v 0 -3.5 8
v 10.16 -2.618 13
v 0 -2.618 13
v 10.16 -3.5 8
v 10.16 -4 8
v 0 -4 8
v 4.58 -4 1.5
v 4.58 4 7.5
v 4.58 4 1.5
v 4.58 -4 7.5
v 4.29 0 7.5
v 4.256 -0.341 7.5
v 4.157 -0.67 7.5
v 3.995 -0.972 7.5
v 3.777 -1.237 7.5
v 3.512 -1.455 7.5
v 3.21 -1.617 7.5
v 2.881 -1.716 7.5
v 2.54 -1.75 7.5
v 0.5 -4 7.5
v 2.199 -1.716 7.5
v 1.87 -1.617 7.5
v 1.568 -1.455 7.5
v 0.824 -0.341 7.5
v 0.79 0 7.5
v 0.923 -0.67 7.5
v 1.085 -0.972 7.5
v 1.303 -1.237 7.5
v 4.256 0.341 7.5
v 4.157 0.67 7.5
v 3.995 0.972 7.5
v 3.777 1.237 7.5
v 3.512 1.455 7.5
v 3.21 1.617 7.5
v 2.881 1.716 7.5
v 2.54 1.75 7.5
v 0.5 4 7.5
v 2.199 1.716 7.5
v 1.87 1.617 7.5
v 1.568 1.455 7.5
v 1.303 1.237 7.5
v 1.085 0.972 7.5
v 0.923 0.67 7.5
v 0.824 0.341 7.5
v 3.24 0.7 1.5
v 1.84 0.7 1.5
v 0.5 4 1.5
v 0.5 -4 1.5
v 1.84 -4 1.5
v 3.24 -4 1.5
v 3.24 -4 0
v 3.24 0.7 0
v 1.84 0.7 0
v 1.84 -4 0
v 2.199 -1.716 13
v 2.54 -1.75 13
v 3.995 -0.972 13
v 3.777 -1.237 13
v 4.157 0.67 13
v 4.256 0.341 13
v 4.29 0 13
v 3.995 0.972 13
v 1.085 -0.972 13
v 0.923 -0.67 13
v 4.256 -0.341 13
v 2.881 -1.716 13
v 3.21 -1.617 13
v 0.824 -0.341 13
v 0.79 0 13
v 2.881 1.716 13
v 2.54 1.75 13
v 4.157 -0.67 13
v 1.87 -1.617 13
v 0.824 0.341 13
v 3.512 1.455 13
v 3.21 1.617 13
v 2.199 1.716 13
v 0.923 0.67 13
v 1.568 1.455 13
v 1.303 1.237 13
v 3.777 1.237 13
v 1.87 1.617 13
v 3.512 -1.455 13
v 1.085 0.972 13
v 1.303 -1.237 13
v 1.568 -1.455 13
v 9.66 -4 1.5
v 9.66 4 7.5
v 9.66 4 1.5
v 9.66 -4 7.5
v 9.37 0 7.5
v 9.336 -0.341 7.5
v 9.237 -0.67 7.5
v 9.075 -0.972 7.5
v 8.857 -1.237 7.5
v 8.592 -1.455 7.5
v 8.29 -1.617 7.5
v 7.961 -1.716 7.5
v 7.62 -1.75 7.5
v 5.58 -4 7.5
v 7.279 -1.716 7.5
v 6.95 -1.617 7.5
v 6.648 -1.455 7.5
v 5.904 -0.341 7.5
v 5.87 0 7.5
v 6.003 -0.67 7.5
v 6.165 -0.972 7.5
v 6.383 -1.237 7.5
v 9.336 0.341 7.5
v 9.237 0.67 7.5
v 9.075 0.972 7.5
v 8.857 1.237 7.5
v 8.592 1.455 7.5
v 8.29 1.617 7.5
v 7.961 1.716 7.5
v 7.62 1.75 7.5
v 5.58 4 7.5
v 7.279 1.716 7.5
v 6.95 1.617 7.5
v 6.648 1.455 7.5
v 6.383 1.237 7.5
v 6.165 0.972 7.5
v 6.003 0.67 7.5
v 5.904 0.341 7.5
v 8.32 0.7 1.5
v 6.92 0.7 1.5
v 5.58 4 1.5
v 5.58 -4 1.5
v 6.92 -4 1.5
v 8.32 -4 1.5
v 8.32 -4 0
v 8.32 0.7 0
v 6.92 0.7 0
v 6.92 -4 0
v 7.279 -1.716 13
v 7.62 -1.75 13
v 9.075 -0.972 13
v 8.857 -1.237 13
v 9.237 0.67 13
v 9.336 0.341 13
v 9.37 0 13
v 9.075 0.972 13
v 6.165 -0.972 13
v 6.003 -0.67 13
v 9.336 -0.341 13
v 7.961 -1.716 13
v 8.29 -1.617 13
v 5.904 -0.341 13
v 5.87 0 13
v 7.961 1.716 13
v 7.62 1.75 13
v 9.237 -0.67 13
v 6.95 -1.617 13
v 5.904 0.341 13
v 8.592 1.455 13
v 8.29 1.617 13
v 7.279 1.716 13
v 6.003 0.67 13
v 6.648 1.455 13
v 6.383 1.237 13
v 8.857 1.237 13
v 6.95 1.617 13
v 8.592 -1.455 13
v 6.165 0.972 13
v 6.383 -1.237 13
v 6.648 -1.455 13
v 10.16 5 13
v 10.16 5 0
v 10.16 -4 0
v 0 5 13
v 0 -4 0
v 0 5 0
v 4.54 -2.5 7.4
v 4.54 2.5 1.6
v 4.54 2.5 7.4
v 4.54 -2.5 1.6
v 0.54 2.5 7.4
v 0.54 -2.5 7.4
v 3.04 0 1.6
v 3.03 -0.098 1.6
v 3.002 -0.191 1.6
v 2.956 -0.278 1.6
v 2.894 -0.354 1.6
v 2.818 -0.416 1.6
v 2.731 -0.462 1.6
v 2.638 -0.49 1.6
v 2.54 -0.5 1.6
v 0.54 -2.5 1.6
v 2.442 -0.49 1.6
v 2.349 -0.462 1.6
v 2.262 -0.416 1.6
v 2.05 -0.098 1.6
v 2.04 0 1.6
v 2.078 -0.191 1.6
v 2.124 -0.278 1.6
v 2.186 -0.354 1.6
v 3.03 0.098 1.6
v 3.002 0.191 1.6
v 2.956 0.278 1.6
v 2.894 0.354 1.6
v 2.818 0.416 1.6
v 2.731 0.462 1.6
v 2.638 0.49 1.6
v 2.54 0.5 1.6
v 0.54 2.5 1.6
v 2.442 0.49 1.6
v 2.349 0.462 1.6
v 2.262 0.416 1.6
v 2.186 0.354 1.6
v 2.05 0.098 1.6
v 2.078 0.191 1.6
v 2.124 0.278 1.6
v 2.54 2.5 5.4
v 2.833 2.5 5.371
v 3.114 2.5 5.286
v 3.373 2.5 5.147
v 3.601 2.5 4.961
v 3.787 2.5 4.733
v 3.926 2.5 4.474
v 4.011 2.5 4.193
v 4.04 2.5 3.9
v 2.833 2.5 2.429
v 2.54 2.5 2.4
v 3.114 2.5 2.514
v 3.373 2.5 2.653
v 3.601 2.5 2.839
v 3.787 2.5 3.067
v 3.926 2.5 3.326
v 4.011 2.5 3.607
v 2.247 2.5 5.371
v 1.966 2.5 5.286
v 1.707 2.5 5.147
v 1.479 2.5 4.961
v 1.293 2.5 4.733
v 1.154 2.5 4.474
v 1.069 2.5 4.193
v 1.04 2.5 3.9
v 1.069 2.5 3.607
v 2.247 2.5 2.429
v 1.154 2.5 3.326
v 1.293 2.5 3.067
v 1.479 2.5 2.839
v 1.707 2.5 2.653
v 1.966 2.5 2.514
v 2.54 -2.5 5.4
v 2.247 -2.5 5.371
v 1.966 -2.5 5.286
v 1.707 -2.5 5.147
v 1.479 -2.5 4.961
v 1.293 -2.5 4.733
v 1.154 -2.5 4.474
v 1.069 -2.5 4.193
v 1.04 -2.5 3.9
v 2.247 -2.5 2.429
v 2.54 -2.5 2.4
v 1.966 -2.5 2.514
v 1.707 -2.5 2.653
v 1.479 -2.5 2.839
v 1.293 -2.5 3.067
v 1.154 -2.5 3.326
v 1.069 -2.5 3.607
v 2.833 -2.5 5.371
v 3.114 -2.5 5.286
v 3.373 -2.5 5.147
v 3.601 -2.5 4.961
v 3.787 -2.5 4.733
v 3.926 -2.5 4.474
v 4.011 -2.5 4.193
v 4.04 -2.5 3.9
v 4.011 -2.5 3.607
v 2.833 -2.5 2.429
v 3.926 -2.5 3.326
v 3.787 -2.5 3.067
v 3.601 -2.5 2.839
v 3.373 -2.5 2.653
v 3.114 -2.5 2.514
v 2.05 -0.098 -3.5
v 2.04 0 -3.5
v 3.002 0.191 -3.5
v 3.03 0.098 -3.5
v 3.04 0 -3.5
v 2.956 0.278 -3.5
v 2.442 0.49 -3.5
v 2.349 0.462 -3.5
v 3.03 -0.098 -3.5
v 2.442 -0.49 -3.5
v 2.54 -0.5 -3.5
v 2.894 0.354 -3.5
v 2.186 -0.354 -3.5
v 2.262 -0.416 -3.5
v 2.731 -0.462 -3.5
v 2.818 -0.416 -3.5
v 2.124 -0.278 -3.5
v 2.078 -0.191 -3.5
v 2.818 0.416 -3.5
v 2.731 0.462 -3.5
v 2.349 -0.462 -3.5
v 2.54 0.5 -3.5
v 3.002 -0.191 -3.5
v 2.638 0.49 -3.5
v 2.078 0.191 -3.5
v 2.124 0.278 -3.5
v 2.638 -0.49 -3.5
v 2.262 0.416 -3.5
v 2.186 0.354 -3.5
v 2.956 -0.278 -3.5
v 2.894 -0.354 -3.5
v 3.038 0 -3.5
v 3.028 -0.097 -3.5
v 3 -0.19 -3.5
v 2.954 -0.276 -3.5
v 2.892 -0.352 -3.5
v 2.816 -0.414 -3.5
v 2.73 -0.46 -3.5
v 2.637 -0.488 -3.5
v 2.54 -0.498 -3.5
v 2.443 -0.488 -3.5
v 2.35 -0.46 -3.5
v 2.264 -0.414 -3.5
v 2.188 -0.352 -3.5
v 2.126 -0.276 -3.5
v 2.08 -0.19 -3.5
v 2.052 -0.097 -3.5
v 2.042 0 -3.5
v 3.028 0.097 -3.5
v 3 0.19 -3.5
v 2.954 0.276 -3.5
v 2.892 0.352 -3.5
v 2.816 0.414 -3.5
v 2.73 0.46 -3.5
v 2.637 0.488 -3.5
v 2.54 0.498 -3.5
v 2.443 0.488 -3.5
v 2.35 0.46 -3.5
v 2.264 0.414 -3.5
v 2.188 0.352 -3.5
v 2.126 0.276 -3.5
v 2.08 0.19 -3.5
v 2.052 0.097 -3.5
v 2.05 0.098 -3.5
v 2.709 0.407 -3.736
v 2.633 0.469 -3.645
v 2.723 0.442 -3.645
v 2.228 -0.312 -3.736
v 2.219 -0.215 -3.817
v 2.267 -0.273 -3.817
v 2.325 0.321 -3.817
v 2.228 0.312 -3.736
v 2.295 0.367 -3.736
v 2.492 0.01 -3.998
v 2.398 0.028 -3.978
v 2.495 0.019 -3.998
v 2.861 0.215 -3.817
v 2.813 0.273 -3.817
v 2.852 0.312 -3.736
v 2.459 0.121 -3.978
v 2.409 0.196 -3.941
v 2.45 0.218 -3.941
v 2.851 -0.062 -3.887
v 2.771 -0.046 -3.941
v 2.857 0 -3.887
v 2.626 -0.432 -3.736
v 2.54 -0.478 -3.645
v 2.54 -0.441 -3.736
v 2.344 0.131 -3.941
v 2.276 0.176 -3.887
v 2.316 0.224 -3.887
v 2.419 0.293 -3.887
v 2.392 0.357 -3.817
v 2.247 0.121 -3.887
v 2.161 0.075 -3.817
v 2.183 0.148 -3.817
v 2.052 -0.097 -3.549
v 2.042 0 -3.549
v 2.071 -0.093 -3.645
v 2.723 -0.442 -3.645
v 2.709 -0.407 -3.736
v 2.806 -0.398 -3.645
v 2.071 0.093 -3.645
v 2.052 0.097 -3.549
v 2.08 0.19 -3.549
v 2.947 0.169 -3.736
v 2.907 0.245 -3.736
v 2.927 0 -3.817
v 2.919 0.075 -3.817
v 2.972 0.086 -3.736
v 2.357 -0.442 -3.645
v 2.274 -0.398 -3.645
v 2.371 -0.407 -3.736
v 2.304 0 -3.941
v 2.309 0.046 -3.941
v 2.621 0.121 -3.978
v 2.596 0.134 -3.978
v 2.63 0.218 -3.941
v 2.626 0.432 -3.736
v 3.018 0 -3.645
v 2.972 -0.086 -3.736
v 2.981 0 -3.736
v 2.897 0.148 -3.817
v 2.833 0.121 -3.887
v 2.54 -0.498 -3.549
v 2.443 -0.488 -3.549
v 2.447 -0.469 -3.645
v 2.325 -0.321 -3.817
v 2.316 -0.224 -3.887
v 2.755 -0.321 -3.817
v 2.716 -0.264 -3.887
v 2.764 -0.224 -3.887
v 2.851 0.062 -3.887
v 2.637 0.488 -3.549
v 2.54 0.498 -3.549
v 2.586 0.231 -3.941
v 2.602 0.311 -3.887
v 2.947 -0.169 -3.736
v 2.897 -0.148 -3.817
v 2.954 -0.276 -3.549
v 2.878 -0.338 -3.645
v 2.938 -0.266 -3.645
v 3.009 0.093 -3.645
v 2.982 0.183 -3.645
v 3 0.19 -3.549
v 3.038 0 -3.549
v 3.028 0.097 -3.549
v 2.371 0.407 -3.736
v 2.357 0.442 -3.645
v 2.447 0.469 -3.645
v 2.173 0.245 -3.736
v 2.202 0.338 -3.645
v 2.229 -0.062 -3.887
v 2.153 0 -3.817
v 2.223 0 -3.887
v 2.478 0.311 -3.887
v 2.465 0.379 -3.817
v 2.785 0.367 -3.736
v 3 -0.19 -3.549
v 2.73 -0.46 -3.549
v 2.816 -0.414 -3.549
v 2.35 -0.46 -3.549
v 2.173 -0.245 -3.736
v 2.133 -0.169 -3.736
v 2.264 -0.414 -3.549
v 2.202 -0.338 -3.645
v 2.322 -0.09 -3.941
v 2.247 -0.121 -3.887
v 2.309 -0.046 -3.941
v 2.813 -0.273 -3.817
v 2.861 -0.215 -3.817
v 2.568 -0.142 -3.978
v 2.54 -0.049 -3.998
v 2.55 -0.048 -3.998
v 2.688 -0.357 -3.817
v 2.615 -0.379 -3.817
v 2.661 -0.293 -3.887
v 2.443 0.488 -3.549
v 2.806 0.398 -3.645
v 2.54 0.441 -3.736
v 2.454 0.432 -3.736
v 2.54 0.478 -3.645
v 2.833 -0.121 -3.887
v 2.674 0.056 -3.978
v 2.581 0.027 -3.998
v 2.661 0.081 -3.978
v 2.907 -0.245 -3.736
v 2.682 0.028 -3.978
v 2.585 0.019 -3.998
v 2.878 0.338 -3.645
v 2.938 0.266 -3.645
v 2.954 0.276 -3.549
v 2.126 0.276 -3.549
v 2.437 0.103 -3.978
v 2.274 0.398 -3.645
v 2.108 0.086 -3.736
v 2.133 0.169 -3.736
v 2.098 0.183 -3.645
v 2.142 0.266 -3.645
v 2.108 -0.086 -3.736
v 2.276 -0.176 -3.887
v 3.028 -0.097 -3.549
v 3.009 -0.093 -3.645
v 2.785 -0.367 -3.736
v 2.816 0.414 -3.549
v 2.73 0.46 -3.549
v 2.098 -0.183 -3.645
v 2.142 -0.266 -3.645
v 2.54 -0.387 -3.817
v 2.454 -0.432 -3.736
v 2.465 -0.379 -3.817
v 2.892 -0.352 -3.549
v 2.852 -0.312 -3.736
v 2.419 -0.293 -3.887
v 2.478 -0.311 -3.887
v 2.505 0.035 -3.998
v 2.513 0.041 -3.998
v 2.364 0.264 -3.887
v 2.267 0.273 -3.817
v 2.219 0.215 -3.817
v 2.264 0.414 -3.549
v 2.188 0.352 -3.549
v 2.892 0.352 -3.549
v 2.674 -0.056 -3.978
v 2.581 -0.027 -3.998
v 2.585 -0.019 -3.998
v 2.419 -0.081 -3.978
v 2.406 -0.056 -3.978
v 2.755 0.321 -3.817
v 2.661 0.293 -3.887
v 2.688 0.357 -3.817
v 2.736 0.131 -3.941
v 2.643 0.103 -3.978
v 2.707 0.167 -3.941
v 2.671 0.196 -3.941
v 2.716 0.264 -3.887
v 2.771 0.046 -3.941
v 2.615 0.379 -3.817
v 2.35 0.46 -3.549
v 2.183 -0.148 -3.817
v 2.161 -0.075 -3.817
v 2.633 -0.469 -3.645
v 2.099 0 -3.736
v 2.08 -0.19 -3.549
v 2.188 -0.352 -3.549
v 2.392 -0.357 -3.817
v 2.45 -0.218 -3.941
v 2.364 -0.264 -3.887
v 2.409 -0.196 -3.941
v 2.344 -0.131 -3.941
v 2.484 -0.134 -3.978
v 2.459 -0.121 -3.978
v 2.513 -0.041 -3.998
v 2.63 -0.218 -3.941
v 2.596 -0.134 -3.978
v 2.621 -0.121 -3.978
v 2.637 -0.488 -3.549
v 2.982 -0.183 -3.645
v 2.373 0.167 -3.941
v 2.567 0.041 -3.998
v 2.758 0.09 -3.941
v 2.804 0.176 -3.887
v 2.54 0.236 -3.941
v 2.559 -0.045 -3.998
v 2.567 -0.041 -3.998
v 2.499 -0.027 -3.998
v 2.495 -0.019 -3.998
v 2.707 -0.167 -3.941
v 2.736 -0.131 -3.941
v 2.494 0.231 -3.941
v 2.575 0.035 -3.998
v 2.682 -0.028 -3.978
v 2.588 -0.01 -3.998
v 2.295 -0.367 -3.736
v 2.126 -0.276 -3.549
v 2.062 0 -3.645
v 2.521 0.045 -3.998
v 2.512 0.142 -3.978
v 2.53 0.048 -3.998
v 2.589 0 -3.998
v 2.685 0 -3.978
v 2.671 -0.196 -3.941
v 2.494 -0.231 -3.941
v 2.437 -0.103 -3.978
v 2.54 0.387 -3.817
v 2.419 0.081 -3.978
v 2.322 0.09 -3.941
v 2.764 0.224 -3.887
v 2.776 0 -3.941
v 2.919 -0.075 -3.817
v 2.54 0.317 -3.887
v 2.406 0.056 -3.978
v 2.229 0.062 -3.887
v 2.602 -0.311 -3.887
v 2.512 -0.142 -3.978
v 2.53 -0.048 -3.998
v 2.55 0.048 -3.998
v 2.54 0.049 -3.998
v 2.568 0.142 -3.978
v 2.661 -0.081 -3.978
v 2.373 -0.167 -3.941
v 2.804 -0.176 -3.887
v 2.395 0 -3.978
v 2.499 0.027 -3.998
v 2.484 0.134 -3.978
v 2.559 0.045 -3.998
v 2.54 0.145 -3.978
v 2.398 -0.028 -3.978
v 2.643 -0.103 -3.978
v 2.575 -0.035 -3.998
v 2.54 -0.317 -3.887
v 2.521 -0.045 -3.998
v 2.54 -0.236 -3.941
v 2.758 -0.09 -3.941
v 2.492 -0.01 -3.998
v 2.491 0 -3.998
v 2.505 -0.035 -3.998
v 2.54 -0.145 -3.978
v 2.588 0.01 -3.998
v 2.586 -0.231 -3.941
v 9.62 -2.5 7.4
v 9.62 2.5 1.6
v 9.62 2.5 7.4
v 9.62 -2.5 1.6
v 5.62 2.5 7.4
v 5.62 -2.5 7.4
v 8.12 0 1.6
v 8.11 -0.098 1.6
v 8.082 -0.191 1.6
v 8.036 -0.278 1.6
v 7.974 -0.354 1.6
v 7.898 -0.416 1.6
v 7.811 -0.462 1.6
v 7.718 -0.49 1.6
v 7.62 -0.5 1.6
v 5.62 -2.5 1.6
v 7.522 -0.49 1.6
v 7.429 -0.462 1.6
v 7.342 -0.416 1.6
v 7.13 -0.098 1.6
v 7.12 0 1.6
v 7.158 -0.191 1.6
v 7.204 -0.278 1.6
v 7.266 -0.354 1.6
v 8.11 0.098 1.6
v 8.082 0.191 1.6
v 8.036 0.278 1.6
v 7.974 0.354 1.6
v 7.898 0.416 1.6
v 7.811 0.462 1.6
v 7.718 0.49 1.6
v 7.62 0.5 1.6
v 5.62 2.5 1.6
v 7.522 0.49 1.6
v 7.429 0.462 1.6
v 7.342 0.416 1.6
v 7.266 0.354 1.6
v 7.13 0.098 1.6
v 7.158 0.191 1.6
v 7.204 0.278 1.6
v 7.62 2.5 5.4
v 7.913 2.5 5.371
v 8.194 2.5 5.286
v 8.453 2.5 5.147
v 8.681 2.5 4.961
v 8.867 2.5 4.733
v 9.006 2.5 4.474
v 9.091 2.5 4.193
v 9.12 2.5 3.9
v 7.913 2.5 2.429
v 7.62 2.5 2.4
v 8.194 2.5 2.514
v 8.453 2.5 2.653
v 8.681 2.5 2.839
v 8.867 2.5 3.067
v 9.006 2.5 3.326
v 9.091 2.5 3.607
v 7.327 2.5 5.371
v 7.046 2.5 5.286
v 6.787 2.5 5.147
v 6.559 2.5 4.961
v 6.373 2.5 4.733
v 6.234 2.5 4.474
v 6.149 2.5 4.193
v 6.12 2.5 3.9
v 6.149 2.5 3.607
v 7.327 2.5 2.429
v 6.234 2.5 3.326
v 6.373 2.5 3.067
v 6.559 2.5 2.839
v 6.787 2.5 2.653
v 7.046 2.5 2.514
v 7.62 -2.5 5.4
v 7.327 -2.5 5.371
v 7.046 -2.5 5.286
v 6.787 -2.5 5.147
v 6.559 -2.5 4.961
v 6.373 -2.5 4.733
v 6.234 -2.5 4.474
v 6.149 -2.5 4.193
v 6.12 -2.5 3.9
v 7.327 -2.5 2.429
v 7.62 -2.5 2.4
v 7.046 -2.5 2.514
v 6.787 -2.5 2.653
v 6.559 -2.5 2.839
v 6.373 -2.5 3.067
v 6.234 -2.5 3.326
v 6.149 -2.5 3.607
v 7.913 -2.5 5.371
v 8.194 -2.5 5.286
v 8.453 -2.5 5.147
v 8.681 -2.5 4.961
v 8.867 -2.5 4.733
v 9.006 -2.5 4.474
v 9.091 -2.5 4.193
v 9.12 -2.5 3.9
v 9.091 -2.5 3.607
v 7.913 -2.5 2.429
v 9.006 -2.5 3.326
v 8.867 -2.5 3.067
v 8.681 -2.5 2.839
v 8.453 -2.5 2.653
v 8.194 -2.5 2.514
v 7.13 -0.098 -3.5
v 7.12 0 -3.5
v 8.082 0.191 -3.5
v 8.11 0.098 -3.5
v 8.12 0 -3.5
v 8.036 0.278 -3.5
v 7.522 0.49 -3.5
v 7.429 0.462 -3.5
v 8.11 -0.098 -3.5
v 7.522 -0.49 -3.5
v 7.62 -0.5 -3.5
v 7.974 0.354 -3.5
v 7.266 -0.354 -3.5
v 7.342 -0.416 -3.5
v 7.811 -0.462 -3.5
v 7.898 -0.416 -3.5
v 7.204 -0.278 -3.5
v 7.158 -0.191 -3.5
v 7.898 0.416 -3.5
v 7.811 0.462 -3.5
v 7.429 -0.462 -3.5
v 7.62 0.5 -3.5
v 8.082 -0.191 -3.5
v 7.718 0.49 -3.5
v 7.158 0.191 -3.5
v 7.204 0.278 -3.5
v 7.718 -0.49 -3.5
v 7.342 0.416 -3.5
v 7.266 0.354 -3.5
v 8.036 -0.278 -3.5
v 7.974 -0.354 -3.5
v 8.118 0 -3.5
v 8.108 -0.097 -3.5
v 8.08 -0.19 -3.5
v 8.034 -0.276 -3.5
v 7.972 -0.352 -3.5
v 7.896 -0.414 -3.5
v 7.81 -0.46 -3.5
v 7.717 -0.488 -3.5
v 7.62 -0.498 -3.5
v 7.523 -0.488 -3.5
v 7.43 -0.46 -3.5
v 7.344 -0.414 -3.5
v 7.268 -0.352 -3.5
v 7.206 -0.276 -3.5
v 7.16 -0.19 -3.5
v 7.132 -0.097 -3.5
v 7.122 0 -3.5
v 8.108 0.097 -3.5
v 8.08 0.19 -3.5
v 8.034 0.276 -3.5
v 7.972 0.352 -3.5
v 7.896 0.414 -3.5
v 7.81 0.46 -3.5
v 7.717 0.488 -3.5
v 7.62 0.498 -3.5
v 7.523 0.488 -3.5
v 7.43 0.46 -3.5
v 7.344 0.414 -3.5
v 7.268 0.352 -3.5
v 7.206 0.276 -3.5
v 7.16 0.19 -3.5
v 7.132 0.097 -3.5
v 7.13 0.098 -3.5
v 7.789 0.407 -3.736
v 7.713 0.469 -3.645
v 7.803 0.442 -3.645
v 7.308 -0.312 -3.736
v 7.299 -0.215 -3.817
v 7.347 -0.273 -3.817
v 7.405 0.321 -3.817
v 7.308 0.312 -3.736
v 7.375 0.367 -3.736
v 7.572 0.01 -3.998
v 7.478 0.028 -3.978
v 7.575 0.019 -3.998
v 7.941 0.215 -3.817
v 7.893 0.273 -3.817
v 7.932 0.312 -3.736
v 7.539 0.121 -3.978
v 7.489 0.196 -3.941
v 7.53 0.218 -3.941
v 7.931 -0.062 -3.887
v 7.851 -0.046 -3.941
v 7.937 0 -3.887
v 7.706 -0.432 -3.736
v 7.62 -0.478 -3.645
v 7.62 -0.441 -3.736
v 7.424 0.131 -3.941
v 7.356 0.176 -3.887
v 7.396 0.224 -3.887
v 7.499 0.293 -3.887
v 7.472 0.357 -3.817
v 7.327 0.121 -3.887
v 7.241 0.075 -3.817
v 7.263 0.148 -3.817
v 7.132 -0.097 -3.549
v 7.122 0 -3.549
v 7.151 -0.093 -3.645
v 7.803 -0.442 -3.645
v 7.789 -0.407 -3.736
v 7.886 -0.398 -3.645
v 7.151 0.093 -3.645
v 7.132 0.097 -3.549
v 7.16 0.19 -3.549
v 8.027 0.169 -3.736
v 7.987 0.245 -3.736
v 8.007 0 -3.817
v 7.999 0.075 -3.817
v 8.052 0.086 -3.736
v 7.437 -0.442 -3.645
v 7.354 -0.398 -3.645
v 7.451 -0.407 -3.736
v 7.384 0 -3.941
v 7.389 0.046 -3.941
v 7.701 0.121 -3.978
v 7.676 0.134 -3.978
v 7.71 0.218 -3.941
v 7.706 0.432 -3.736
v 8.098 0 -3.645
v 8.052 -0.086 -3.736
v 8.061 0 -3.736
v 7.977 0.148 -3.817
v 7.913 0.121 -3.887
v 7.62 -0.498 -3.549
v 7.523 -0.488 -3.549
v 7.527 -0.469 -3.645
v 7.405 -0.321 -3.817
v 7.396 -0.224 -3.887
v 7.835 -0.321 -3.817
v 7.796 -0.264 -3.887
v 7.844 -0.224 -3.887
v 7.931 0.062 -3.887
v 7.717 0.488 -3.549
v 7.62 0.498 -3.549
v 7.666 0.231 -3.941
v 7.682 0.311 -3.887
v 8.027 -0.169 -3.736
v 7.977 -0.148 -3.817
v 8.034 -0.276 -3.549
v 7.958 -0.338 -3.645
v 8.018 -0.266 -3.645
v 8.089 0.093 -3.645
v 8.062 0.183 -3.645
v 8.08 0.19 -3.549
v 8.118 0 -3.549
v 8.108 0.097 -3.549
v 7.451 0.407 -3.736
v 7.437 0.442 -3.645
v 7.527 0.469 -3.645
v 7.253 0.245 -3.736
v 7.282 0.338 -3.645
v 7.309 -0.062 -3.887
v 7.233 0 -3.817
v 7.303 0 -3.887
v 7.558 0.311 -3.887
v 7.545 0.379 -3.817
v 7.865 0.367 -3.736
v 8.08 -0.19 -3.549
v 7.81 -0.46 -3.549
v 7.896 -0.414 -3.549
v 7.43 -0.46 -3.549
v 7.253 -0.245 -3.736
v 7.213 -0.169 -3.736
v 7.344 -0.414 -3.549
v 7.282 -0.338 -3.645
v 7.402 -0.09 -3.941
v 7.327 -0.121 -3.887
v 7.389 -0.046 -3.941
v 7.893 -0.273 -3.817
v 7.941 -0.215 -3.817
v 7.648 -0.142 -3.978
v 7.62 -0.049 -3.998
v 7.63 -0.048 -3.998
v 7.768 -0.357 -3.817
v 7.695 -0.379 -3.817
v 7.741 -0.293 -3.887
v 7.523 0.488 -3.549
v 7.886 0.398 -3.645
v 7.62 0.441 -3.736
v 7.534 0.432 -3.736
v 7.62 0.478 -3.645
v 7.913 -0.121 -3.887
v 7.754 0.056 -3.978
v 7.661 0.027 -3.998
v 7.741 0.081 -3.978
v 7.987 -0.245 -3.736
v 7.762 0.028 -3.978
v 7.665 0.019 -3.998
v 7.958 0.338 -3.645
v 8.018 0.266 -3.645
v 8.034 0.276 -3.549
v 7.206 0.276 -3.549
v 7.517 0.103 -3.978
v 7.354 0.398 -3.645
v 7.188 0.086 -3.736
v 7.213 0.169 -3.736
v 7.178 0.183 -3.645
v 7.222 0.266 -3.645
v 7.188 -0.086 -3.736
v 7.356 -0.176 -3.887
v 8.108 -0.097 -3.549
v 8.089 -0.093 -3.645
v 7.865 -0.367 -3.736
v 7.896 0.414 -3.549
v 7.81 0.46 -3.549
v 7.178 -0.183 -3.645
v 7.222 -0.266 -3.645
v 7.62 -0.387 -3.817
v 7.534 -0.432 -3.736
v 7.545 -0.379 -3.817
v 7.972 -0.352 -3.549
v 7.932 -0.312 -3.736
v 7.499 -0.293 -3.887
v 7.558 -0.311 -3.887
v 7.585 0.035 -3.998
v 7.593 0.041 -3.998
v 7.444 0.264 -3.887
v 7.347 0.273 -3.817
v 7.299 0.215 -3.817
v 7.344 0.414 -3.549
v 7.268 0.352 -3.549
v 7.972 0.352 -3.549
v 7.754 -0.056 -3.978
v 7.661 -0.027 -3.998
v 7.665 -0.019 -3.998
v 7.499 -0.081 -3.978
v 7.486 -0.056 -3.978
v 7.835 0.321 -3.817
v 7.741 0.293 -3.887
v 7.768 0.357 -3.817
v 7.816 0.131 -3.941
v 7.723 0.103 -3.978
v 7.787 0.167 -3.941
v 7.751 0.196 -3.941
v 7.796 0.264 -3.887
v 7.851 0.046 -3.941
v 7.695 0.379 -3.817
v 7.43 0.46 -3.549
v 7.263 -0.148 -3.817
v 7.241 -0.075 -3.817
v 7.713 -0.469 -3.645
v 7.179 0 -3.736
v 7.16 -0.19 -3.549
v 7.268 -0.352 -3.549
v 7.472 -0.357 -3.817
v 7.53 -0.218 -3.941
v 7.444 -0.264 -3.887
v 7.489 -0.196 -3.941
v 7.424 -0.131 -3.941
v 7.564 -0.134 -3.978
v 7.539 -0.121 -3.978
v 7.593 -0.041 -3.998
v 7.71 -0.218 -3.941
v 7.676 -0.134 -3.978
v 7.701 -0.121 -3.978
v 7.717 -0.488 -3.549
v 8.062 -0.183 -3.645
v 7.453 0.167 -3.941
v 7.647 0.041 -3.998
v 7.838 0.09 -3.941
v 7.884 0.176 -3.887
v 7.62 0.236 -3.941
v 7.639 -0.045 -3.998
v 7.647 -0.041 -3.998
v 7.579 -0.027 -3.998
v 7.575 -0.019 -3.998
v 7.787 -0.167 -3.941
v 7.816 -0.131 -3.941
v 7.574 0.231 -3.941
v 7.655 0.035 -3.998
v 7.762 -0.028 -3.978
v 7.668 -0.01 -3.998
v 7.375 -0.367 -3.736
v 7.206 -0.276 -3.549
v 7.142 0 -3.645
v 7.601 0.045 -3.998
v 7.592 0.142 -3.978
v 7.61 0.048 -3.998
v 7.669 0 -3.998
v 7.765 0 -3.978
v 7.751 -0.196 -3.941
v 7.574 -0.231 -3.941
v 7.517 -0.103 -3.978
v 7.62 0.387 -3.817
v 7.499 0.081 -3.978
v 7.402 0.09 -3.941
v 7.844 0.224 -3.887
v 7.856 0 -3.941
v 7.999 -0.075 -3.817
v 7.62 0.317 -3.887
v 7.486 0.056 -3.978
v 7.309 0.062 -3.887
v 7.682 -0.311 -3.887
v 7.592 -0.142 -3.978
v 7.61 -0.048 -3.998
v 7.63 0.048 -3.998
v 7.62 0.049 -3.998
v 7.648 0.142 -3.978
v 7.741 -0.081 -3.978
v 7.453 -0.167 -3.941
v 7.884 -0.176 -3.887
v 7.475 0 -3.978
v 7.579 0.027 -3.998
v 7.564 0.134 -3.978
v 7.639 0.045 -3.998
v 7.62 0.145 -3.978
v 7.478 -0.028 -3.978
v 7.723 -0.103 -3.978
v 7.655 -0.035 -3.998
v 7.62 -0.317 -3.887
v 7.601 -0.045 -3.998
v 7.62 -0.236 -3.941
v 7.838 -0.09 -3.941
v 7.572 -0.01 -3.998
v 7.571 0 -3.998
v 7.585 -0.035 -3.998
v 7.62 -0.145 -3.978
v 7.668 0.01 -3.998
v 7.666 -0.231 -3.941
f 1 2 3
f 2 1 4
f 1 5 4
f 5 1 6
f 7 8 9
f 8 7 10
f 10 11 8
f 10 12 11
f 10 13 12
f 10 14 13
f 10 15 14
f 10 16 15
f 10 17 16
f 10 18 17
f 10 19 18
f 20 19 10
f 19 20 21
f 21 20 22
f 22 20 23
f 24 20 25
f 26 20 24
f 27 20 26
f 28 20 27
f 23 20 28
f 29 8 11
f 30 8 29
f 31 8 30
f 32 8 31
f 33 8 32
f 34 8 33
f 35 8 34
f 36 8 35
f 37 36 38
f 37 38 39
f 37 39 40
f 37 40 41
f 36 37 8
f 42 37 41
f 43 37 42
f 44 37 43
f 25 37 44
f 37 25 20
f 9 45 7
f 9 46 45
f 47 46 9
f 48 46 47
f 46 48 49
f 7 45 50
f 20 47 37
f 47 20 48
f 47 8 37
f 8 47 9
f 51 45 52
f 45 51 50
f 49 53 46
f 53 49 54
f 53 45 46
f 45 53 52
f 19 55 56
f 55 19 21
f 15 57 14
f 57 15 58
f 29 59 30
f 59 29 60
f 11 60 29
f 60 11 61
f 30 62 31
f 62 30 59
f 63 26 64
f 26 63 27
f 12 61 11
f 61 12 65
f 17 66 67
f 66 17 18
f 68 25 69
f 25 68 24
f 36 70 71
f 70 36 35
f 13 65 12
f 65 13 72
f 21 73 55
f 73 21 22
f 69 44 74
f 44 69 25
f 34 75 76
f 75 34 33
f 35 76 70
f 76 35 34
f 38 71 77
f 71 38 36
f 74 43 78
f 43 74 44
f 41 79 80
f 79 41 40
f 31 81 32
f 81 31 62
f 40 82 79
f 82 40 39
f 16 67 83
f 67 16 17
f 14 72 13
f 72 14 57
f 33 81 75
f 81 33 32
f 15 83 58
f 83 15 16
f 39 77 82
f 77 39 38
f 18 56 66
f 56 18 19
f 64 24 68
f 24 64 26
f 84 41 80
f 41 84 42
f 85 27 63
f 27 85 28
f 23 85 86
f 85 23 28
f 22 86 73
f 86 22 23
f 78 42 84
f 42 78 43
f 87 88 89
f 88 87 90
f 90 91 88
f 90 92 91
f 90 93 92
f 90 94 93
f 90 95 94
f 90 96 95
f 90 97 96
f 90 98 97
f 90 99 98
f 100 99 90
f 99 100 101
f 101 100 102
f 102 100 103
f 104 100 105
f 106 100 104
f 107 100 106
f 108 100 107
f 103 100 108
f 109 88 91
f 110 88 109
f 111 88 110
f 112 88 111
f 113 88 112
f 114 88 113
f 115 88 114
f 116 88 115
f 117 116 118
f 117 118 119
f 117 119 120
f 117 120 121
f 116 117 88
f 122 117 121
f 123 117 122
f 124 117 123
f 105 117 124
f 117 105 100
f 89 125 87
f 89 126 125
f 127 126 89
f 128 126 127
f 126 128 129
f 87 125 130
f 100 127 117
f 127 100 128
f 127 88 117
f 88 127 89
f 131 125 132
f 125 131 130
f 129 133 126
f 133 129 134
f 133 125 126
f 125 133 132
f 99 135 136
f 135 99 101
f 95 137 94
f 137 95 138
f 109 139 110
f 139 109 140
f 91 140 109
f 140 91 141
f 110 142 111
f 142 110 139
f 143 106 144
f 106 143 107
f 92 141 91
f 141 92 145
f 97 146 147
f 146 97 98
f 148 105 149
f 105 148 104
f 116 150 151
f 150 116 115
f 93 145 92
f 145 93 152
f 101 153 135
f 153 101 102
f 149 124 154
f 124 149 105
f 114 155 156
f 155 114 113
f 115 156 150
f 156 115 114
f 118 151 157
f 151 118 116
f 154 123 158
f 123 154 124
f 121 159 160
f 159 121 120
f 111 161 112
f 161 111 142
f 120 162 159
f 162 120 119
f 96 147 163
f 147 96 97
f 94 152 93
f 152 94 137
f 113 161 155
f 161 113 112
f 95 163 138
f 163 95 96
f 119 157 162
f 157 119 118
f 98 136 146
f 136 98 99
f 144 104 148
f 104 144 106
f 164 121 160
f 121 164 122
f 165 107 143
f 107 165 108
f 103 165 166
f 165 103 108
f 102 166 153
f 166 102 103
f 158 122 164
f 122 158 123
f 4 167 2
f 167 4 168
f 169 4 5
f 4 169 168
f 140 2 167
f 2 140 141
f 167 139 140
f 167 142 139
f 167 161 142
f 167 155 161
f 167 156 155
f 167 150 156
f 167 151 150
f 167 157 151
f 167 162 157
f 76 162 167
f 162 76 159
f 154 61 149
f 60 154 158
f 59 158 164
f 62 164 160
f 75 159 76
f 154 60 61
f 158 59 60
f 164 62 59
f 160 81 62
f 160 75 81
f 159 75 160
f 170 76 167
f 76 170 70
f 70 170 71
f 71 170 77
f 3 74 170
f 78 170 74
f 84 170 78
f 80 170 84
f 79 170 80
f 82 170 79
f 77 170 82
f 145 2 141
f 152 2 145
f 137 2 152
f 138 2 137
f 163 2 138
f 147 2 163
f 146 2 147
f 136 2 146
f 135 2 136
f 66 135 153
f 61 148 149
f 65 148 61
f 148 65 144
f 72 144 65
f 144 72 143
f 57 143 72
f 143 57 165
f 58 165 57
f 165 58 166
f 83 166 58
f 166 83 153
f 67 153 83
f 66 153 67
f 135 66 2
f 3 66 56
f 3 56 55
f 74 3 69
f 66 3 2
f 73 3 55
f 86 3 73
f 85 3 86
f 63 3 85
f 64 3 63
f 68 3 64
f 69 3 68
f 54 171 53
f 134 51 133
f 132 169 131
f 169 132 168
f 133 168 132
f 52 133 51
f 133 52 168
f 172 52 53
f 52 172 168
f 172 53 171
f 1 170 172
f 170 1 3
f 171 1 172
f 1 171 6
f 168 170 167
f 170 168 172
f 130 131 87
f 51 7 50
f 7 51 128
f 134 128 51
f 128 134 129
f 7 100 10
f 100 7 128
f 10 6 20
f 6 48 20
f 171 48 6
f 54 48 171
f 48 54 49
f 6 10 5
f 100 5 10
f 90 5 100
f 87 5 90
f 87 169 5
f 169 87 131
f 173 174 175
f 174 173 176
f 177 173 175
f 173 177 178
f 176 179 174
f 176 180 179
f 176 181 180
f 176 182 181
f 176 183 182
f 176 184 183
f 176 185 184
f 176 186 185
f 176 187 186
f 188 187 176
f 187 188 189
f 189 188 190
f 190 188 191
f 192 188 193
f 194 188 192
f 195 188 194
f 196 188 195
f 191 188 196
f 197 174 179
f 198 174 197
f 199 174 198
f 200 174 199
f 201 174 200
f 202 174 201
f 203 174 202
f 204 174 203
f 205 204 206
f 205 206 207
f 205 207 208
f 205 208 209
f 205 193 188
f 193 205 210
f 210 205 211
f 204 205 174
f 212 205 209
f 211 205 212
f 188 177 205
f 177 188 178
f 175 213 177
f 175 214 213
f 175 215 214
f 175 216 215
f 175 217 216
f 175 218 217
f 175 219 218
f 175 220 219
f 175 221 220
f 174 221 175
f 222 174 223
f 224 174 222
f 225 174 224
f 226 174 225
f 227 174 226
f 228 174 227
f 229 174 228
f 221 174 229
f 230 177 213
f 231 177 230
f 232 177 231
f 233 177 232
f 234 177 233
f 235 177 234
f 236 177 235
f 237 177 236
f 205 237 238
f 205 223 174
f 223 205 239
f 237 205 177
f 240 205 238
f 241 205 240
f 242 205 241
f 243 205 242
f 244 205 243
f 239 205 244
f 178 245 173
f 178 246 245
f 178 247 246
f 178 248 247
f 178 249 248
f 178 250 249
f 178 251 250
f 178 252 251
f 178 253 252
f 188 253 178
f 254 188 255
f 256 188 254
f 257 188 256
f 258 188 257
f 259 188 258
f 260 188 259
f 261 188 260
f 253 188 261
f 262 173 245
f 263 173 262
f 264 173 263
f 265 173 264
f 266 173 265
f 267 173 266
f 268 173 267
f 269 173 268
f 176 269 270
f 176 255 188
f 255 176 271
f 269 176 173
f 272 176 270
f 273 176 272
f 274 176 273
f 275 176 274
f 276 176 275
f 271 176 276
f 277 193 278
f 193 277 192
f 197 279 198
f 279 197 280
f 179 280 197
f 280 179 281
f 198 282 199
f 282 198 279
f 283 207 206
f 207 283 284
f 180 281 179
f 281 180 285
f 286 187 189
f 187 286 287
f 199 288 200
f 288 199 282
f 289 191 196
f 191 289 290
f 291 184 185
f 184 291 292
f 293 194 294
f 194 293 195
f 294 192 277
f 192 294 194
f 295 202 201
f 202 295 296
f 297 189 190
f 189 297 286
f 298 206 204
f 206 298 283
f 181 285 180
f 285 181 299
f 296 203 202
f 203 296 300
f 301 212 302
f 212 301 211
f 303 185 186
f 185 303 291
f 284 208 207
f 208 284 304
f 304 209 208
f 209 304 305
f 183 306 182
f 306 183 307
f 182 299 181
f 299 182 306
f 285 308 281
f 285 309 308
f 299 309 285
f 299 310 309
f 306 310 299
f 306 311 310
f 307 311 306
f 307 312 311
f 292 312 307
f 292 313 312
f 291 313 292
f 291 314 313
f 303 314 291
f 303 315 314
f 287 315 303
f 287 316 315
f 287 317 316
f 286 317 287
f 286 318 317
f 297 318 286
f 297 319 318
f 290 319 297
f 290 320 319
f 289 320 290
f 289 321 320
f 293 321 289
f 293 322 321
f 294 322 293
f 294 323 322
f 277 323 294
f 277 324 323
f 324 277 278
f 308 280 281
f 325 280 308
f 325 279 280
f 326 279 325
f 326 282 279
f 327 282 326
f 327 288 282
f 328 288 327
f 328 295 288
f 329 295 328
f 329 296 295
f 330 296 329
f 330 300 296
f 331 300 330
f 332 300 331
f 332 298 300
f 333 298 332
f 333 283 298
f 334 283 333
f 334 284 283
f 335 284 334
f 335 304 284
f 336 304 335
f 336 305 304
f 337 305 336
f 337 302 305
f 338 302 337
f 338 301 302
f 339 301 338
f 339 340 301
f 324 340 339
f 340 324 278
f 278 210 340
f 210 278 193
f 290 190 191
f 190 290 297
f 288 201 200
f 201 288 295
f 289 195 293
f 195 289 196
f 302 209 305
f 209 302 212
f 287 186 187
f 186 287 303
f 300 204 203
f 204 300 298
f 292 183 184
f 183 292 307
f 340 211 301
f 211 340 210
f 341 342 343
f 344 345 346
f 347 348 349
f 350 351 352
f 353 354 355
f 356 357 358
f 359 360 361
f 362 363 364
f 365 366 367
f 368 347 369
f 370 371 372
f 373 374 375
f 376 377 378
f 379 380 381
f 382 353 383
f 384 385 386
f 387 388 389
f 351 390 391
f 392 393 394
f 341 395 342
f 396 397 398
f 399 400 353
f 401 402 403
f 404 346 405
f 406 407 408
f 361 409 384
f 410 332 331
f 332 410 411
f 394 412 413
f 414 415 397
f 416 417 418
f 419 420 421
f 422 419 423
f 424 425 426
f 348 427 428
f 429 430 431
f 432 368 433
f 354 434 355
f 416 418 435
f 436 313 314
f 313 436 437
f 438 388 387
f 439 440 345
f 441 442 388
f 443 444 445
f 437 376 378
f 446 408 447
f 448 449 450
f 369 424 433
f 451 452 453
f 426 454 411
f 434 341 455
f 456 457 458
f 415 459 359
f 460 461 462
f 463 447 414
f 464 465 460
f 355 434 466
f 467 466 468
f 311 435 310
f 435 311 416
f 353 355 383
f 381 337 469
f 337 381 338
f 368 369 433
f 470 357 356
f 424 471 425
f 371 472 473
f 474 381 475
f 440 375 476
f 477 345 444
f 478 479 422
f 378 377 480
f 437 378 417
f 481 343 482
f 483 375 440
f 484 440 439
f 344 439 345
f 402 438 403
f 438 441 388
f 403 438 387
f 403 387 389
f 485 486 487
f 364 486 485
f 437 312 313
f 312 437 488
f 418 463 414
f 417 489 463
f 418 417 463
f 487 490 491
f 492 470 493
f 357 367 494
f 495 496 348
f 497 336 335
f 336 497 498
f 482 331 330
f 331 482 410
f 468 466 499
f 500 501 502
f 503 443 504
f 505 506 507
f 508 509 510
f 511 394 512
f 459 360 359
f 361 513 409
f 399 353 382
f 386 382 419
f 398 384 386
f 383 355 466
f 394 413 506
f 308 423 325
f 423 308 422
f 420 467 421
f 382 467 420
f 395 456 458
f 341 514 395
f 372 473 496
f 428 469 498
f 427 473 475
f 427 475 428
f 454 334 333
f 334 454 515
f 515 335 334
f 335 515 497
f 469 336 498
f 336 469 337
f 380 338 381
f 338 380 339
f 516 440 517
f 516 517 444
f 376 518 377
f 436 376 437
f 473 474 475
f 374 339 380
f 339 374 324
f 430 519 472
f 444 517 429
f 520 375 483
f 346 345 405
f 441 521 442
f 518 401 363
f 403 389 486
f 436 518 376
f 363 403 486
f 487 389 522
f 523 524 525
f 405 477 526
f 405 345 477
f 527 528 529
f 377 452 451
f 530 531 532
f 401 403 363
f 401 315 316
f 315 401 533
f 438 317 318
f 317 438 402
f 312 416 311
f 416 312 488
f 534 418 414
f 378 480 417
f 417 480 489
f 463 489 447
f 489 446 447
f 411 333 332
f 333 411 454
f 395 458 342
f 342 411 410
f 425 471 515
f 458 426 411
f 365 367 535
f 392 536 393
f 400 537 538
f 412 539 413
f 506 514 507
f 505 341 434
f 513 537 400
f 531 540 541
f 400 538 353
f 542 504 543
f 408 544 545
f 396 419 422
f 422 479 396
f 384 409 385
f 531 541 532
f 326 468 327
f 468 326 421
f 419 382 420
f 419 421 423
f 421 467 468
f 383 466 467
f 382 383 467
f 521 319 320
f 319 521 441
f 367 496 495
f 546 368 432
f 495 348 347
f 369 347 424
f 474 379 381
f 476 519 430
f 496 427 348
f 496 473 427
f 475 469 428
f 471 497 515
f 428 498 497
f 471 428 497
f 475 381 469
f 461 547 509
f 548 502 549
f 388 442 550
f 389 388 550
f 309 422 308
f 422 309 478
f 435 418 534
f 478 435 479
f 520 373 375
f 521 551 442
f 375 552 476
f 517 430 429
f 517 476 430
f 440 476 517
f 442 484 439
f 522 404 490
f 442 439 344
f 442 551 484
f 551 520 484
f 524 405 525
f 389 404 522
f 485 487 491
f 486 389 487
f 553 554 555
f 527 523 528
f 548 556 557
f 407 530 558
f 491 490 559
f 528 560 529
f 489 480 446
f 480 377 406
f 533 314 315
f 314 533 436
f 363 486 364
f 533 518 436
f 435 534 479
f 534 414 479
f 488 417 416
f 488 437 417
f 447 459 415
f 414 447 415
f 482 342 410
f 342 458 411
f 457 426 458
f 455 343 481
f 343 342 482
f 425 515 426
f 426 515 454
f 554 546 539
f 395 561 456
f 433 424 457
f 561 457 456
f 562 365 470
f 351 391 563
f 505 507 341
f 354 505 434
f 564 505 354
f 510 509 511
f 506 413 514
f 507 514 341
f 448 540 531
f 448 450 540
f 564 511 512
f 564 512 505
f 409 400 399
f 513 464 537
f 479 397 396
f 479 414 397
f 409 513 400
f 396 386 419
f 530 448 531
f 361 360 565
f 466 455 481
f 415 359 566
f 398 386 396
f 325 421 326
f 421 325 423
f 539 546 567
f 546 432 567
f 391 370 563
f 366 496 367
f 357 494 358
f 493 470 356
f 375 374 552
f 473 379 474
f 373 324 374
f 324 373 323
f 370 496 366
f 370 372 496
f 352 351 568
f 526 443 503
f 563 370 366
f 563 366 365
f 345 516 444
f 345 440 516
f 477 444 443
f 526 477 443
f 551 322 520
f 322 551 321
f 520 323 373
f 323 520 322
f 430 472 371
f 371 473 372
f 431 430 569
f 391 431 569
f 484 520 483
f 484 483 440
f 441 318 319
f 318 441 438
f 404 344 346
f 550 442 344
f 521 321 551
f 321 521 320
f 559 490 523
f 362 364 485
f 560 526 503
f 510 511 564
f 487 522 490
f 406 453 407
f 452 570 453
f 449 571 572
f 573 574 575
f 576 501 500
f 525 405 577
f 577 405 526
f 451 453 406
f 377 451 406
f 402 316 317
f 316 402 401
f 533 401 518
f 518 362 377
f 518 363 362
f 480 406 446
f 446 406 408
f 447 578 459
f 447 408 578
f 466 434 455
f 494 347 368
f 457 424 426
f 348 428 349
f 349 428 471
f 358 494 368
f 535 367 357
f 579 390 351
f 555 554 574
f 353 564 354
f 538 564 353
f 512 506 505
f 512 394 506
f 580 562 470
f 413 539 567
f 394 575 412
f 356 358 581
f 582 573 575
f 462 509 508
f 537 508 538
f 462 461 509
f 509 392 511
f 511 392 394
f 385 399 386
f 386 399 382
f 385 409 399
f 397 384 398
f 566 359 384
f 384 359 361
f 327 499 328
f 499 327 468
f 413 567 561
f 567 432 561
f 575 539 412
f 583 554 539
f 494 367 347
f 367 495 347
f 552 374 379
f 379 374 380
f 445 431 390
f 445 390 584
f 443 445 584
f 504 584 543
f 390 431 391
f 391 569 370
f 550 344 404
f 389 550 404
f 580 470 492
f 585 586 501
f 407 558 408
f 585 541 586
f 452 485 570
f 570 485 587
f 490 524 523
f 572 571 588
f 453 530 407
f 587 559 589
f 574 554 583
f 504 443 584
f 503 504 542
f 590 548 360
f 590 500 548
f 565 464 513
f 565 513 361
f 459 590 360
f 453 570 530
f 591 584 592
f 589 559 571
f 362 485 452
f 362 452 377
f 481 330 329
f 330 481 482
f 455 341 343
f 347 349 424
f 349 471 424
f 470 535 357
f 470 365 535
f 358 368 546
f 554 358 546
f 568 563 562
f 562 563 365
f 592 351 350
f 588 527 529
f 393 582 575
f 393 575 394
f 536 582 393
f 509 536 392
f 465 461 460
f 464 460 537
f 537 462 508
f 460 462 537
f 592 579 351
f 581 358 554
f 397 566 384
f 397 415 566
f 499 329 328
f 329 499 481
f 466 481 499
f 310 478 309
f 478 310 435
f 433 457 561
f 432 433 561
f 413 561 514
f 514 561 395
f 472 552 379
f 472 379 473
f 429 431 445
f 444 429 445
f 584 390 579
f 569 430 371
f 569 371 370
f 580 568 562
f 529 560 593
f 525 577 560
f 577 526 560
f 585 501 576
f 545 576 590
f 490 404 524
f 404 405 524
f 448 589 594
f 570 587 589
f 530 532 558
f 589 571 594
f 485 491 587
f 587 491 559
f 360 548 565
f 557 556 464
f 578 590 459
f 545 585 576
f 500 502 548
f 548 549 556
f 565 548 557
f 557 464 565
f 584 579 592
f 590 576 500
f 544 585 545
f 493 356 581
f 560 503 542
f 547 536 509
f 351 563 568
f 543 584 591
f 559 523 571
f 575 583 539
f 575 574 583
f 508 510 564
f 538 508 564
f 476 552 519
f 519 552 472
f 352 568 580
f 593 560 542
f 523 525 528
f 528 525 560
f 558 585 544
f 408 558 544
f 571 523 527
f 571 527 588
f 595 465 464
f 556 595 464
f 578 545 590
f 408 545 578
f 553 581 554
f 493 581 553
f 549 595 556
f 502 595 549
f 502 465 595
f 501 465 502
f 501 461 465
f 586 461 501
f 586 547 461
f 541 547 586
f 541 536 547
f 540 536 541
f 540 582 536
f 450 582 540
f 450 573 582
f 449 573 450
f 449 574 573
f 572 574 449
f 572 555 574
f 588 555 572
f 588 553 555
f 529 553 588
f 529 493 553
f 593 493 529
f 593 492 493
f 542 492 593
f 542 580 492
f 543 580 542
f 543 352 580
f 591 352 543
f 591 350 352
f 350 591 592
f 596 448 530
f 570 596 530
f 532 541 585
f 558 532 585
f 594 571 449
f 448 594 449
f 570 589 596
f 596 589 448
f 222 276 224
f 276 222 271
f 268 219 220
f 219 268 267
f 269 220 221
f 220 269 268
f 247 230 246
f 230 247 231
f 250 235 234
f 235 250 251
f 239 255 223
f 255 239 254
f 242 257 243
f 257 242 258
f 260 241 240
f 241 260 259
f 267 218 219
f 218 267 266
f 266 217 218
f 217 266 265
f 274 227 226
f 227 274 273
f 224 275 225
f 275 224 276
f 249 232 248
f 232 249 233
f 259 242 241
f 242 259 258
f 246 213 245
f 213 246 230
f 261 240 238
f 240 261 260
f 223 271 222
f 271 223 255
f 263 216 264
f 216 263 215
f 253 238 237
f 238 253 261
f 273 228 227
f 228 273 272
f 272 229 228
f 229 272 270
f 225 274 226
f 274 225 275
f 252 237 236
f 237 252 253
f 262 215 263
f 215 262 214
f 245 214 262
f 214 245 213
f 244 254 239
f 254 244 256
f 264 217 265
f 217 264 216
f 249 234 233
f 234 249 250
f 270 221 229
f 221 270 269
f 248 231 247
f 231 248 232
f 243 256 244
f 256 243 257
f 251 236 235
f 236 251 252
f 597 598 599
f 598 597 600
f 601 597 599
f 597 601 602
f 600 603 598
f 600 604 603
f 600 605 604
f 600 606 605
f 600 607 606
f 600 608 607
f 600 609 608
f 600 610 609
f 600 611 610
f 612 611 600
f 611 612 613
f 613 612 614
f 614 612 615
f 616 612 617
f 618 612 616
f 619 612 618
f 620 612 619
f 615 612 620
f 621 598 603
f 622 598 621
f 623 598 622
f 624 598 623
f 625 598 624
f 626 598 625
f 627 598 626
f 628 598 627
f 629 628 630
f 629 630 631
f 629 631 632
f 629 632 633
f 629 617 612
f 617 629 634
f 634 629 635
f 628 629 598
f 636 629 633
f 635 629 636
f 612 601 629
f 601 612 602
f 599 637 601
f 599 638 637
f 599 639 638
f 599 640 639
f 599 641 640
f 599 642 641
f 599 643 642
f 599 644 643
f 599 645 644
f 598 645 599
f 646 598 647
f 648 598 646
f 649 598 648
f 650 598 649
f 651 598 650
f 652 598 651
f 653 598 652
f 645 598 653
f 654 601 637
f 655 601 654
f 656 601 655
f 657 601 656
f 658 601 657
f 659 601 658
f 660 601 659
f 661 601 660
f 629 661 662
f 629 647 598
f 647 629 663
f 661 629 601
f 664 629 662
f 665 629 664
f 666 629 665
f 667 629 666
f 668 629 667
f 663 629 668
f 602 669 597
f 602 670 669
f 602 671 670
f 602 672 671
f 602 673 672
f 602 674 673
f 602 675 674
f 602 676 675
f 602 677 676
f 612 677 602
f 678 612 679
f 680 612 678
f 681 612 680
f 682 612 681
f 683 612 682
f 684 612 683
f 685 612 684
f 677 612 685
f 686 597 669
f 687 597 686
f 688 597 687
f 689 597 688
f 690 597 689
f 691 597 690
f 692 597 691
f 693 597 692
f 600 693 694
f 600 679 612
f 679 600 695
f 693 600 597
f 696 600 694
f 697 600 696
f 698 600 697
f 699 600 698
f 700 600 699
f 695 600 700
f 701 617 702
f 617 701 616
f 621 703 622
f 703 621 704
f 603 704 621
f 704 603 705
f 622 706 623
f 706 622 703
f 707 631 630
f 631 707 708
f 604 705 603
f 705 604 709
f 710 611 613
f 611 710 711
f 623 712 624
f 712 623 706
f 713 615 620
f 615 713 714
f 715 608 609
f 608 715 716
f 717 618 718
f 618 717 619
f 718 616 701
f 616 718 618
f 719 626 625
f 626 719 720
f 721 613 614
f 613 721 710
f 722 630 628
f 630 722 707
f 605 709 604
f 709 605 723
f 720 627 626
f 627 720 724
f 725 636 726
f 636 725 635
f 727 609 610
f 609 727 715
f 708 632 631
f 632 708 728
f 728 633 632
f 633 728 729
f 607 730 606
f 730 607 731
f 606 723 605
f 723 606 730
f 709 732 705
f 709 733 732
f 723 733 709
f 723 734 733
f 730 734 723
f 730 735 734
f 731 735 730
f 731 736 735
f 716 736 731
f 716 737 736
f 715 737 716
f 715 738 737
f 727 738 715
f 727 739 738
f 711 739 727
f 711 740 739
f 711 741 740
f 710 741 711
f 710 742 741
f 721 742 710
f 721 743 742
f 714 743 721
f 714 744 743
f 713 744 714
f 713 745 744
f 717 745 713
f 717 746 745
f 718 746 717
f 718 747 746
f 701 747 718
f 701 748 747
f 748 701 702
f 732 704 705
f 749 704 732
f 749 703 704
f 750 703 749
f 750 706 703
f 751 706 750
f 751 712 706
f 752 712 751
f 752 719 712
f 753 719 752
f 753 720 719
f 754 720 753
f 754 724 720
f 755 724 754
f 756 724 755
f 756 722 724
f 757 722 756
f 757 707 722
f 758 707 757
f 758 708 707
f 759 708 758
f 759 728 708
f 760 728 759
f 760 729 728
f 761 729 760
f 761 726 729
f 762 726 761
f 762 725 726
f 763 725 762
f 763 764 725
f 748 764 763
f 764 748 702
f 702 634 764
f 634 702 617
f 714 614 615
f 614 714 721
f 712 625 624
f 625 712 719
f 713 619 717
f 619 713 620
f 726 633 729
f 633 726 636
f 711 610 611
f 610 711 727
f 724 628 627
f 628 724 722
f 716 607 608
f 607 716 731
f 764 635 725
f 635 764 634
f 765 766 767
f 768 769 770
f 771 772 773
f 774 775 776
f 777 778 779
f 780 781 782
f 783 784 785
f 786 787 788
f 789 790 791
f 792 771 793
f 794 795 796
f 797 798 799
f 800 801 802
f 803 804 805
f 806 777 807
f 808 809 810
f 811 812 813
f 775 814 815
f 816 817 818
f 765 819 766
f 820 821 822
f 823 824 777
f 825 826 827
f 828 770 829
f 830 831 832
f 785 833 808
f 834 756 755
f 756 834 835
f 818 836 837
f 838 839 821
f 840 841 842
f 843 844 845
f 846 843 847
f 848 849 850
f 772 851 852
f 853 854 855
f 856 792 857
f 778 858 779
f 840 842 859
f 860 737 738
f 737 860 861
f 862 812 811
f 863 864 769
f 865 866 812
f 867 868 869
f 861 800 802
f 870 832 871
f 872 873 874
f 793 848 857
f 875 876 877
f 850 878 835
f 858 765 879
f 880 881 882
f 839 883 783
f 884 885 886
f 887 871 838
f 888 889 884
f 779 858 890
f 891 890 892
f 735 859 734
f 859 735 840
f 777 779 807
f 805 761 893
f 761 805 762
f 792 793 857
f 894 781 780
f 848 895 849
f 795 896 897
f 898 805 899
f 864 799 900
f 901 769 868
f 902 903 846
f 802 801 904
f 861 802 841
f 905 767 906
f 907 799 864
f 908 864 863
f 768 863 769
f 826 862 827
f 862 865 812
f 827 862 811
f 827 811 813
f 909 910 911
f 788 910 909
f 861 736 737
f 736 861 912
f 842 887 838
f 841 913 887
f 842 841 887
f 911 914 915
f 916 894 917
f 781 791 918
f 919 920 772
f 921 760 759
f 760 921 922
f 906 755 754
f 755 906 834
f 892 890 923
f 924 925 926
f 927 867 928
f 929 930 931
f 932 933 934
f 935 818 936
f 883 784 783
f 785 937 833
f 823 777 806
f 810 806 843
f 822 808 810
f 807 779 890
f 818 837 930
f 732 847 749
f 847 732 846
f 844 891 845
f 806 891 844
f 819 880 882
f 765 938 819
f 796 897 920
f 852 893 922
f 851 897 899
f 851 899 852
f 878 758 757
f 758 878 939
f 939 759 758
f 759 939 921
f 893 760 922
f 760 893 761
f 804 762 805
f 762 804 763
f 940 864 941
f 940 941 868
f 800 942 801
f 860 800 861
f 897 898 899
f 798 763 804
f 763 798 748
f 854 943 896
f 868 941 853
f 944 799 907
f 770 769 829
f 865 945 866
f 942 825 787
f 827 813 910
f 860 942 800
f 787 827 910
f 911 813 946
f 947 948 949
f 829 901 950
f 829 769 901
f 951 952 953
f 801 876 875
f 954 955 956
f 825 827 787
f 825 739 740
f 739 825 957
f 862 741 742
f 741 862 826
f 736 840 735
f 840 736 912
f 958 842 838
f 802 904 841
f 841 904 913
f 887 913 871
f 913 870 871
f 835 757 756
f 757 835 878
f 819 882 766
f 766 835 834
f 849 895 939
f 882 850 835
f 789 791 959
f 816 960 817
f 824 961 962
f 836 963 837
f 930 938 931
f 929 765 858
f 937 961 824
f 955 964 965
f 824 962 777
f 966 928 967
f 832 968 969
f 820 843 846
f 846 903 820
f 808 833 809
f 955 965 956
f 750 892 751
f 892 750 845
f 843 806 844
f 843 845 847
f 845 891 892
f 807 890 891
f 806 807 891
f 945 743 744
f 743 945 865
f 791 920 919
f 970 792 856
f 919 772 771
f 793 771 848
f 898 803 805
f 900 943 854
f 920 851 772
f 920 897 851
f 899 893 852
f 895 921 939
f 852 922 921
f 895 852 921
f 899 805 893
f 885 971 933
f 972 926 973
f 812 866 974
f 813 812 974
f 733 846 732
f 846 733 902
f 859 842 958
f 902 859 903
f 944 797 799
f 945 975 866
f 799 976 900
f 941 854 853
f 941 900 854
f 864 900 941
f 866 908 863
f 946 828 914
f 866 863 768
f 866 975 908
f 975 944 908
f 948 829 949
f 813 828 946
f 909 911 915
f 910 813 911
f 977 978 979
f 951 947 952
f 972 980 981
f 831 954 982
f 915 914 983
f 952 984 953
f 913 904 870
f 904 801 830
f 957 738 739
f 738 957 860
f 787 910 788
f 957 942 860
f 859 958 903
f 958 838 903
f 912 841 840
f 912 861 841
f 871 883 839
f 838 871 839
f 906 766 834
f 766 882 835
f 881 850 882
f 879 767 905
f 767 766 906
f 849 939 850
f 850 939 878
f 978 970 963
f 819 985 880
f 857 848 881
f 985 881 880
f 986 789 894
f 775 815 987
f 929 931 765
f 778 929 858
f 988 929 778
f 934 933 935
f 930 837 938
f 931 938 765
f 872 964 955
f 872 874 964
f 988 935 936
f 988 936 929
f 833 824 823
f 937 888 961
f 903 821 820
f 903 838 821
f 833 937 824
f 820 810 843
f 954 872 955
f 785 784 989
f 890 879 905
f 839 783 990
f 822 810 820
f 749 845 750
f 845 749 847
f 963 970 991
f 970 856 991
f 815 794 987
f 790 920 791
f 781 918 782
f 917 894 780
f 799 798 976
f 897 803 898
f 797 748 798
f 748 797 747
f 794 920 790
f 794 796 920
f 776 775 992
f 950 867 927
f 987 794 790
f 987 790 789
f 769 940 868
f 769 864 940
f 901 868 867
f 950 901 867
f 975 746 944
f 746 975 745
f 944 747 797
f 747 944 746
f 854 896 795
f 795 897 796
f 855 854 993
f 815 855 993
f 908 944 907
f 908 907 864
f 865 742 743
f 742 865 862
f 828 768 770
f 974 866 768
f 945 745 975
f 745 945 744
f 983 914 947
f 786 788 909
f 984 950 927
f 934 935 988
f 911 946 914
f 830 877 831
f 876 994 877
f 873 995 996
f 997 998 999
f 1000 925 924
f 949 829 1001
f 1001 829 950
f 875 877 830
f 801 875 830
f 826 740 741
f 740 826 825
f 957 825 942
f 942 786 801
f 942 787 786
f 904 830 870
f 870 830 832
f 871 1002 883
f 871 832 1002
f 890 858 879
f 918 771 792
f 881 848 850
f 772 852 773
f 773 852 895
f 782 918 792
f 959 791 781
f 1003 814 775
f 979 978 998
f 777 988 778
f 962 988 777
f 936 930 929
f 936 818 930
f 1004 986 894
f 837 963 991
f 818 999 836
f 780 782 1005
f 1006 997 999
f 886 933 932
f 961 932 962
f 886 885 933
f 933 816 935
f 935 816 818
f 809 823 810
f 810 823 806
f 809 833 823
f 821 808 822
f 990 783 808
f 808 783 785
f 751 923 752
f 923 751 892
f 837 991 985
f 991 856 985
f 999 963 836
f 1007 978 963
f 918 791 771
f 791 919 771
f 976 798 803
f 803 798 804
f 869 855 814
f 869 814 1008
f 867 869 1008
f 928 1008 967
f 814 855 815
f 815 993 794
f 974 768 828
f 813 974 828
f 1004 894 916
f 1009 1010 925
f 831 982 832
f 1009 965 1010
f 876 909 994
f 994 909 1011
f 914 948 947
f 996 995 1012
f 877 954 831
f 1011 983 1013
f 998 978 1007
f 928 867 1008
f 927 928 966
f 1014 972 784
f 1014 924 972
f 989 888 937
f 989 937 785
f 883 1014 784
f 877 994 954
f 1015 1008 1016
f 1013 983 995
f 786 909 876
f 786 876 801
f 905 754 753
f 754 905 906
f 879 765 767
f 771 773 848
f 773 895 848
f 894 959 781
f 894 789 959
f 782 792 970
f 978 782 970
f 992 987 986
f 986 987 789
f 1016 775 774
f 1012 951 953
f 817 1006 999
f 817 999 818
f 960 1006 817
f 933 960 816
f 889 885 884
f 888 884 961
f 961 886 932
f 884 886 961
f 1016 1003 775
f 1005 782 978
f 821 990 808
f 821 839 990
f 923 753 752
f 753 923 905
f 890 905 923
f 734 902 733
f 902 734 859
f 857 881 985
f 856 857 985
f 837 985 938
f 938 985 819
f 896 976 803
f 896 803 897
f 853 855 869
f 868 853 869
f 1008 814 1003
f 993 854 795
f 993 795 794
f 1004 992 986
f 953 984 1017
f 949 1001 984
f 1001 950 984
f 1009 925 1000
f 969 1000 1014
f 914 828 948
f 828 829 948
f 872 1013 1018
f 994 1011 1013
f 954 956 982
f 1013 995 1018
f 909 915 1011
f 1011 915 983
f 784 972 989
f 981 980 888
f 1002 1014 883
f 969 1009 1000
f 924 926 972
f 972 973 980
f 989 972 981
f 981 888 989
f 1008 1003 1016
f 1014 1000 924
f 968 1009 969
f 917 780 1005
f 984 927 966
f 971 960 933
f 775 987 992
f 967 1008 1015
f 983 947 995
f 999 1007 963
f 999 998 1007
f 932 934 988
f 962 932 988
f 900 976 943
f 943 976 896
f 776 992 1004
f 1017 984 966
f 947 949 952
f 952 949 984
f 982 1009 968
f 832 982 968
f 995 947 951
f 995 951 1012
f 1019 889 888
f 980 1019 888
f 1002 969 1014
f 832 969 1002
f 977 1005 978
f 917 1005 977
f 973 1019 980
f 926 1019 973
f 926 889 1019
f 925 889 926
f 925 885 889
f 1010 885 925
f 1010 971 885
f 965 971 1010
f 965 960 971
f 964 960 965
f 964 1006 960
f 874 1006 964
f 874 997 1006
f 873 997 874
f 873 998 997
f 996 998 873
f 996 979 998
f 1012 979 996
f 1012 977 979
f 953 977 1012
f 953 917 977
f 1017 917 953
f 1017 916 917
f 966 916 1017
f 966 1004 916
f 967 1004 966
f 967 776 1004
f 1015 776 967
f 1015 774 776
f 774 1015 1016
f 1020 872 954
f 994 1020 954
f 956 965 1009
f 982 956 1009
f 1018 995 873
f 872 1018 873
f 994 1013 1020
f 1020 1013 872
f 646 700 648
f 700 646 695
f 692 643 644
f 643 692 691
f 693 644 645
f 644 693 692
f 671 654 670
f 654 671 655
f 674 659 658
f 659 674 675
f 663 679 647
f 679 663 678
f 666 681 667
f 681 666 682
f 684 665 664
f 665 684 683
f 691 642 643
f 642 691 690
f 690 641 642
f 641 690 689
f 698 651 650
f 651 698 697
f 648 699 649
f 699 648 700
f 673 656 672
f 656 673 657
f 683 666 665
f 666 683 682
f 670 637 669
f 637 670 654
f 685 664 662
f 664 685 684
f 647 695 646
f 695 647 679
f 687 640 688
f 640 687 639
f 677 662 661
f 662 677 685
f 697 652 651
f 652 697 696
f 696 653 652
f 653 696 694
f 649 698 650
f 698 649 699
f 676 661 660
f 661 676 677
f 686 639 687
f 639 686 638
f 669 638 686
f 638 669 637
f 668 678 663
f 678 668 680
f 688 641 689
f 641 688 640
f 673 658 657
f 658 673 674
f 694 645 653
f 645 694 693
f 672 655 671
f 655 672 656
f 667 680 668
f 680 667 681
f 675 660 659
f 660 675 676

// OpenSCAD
$fn=32;
P = 2;

union() {
    difference() {
        translate([0,-4,0])
            color("DodgerBlue")
            cube([P*5.08, 9, 13]);

        union() {
            translate([0,-4+0.5,8])
                union() {
                    rotate([-10,0,0])
                        translate([-5,-10,0])
                            color("DodgerBlue")
                            cube([P*5.08+10,10,10]);
                    translate([-5,-10,0])
                        color("DodgerBlue")
                        cube([P*5.08+10,10,10]);
                }

            for (i = [0:P-1]) {
                translate([5.08*i,0,0]) {
                    translate([0.5,-10+5-1,1.5])
                        color("DodgerBlue")
                        cube([5.08-1,10,6]);
                    translate([2.54-0.7,-10+0.7,-1])
                        color("DodgerBlue")
                        cube([1.4,10,3]);
                    translate([2.54,0,5])
                        color("DodgerBlue")
                        cylinder(20,d=3.5);
                }
            }
        }
    }

    for (i = [0:P-1]) {
        translate([5.08*i,0,0])
            difference() {
                union() {
                    translate([(5.08-4)/2,-5/2,1.6])
                        color("GhostWhite") cube([4,5,5.8]);
                    translate([2.54,0,-6+2.5])
                        color("GhostWhite") cylinder(h=6,d=1);
                    translate([2.54,0,-4+0.5])
                        color("GhostWhite") sphere(d=1);
                }
                translate([2.54,0,3.9])
                    rotate([90,0,0])
                        color("GhostWhite") cylinder(h=20,d=3,center=true);
            }
    }
}
